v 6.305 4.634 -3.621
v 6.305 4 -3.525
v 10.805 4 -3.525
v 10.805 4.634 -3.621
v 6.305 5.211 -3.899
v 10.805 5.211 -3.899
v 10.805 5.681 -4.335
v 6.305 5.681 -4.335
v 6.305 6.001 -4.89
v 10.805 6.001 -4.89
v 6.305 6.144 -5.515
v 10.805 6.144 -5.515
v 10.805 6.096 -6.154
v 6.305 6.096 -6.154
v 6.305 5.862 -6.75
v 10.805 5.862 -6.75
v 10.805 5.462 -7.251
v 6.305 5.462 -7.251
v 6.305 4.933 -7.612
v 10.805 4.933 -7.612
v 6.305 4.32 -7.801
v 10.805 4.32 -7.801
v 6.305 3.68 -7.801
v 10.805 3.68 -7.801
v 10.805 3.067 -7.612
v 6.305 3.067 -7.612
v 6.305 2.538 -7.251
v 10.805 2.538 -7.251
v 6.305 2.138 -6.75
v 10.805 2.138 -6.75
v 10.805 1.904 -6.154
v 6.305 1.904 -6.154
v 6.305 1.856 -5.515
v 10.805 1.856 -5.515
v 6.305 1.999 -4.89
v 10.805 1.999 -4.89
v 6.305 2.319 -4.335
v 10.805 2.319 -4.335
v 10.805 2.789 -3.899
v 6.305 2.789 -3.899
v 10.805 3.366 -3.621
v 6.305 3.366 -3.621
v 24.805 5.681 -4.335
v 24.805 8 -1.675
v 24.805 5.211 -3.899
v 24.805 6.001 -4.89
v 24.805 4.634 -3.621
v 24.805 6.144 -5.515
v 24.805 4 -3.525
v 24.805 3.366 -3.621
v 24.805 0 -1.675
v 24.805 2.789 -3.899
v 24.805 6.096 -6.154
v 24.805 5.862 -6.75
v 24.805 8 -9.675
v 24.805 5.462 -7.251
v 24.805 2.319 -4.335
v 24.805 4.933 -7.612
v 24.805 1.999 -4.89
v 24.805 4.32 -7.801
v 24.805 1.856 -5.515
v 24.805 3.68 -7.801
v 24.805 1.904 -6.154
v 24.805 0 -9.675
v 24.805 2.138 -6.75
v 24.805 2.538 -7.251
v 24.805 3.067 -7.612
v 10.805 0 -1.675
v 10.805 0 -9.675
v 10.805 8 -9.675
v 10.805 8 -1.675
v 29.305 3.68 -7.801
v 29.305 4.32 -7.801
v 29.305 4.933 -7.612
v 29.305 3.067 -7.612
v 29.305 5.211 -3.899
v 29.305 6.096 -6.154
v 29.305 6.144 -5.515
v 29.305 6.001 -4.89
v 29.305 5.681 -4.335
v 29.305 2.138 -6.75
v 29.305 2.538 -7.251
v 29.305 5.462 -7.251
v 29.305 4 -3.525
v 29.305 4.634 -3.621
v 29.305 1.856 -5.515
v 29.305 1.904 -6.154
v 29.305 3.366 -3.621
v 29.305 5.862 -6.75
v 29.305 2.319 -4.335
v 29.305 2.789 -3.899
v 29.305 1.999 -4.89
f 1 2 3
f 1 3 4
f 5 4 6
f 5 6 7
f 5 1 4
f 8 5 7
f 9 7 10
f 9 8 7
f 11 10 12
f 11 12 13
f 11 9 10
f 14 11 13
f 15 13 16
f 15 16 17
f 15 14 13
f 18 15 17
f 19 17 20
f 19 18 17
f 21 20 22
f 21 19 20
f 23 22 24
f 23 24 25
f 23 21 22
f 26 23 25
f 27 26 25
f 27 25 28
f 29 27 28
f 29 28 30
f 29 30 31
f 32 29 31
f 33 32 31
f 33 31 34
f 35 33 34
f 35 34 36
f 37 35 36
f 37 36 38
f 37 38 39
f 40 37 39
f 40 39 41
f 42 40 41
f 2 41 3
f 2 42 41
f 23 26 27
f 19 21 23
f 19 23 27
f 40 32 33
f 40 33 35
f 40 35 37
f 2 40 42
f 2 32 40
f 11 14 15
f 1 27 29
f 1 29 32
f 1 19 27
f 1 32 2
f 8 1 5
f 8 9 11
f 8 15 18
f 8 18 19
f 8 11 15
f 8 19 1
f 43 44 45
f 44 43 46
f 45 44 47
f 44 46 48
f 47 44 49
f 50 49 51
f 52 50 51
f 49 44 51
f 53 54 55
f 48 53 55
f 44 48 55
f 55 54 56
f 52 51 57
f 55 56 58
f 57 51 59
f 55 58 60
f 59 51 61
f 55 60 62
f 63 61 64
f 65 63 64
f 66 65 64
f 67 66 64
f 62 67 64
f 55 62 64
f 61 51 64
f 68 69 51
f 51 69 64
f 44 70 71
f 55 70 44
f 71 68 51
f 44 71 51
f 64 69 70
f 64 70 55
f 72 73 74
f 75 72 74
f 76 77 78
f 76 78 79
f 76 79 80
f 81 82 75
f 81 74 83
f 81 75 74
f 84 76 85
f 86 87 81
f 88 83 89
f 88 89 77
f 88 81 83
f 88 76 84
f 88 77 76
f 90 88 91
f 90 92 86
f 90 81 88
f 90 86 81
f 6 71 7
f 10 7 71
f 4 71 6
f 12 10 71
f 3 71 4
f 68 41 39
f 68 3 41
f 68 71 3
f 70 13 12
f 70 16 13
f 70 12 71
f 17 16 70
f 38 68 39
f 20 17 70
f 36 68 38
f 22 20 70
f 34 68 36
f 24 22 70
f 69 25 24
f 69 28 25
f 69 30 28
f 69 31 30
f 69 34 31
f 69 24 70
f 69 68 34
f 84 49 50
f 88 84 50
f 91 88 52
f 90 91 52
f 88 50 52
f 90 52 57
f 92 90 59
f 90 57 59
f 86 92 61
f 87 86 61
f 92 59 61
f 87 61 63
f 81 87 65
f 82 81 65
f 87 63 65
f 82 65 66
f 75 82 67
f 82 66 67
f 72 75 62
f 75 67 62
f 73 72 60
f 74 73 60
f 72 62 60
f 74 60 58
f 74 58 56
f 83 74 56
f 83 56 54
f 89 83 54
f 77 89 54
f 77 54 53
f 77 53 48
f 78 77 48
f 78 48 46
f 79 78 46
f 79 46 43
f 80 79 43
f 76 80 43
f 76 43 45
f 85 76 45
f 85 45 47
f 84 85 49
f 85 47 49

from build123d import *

# Parameters (mm, degrees)
SKETCH1_W           = 14
SKETCH1_H           = 8
BOSS_EXTRUDE1_DEPTH = 8
SKETCH3_R           = 2.15
BOSS_EXTRUDE3_DEPTH = 4.5
BOSS_EXTRUDE4_START = 4.5
SKETCH4_R           = 2.15
BOSS_EXTRUDE4_DEPTH = 4.5


with BuildPart() as part:
    # Sketch1 → Boss-Extrude1 (new body)
    with BuildSketch(Plane(origin=(0, 0, 0), x_dir=(1, 0, 0), z_dir=(0, 1, 0))):
        with Locations((17.805194805, 5.675324675)):
            Rectangle(SKETCH1_W, SKETCH1_H)
    extrude(amount=BOSS_EXTRUDE1_DEPTH)

    # Sketch3 → Boss-Extrude3 (add)
    with BuildSketch(Plane(origin=(24.805194805, 0, 0), x_dir=(0, 0, -1), z_dir=(1, 0, 0))):
        with Locations(Location((5.675324675, 4, 0), (0, 0, 180))):
            Circle(SKETCH3_R)
    extrude(amount=BOSS_EXTRUDE3_DEPTH)

    # Sketch4 → Boss-Extrude4 (add)
    with BuildSketch(Plane.ZY.offset(-10.805194805).offset(BOSS_EXTRUDE4_START)):
        with Locations((-5.675324675, 4)):
            Circle(SKETCH4_R)
    extrude(amount=-BOSS_EXTRUDE4_DEPTH)


solid = part.part
